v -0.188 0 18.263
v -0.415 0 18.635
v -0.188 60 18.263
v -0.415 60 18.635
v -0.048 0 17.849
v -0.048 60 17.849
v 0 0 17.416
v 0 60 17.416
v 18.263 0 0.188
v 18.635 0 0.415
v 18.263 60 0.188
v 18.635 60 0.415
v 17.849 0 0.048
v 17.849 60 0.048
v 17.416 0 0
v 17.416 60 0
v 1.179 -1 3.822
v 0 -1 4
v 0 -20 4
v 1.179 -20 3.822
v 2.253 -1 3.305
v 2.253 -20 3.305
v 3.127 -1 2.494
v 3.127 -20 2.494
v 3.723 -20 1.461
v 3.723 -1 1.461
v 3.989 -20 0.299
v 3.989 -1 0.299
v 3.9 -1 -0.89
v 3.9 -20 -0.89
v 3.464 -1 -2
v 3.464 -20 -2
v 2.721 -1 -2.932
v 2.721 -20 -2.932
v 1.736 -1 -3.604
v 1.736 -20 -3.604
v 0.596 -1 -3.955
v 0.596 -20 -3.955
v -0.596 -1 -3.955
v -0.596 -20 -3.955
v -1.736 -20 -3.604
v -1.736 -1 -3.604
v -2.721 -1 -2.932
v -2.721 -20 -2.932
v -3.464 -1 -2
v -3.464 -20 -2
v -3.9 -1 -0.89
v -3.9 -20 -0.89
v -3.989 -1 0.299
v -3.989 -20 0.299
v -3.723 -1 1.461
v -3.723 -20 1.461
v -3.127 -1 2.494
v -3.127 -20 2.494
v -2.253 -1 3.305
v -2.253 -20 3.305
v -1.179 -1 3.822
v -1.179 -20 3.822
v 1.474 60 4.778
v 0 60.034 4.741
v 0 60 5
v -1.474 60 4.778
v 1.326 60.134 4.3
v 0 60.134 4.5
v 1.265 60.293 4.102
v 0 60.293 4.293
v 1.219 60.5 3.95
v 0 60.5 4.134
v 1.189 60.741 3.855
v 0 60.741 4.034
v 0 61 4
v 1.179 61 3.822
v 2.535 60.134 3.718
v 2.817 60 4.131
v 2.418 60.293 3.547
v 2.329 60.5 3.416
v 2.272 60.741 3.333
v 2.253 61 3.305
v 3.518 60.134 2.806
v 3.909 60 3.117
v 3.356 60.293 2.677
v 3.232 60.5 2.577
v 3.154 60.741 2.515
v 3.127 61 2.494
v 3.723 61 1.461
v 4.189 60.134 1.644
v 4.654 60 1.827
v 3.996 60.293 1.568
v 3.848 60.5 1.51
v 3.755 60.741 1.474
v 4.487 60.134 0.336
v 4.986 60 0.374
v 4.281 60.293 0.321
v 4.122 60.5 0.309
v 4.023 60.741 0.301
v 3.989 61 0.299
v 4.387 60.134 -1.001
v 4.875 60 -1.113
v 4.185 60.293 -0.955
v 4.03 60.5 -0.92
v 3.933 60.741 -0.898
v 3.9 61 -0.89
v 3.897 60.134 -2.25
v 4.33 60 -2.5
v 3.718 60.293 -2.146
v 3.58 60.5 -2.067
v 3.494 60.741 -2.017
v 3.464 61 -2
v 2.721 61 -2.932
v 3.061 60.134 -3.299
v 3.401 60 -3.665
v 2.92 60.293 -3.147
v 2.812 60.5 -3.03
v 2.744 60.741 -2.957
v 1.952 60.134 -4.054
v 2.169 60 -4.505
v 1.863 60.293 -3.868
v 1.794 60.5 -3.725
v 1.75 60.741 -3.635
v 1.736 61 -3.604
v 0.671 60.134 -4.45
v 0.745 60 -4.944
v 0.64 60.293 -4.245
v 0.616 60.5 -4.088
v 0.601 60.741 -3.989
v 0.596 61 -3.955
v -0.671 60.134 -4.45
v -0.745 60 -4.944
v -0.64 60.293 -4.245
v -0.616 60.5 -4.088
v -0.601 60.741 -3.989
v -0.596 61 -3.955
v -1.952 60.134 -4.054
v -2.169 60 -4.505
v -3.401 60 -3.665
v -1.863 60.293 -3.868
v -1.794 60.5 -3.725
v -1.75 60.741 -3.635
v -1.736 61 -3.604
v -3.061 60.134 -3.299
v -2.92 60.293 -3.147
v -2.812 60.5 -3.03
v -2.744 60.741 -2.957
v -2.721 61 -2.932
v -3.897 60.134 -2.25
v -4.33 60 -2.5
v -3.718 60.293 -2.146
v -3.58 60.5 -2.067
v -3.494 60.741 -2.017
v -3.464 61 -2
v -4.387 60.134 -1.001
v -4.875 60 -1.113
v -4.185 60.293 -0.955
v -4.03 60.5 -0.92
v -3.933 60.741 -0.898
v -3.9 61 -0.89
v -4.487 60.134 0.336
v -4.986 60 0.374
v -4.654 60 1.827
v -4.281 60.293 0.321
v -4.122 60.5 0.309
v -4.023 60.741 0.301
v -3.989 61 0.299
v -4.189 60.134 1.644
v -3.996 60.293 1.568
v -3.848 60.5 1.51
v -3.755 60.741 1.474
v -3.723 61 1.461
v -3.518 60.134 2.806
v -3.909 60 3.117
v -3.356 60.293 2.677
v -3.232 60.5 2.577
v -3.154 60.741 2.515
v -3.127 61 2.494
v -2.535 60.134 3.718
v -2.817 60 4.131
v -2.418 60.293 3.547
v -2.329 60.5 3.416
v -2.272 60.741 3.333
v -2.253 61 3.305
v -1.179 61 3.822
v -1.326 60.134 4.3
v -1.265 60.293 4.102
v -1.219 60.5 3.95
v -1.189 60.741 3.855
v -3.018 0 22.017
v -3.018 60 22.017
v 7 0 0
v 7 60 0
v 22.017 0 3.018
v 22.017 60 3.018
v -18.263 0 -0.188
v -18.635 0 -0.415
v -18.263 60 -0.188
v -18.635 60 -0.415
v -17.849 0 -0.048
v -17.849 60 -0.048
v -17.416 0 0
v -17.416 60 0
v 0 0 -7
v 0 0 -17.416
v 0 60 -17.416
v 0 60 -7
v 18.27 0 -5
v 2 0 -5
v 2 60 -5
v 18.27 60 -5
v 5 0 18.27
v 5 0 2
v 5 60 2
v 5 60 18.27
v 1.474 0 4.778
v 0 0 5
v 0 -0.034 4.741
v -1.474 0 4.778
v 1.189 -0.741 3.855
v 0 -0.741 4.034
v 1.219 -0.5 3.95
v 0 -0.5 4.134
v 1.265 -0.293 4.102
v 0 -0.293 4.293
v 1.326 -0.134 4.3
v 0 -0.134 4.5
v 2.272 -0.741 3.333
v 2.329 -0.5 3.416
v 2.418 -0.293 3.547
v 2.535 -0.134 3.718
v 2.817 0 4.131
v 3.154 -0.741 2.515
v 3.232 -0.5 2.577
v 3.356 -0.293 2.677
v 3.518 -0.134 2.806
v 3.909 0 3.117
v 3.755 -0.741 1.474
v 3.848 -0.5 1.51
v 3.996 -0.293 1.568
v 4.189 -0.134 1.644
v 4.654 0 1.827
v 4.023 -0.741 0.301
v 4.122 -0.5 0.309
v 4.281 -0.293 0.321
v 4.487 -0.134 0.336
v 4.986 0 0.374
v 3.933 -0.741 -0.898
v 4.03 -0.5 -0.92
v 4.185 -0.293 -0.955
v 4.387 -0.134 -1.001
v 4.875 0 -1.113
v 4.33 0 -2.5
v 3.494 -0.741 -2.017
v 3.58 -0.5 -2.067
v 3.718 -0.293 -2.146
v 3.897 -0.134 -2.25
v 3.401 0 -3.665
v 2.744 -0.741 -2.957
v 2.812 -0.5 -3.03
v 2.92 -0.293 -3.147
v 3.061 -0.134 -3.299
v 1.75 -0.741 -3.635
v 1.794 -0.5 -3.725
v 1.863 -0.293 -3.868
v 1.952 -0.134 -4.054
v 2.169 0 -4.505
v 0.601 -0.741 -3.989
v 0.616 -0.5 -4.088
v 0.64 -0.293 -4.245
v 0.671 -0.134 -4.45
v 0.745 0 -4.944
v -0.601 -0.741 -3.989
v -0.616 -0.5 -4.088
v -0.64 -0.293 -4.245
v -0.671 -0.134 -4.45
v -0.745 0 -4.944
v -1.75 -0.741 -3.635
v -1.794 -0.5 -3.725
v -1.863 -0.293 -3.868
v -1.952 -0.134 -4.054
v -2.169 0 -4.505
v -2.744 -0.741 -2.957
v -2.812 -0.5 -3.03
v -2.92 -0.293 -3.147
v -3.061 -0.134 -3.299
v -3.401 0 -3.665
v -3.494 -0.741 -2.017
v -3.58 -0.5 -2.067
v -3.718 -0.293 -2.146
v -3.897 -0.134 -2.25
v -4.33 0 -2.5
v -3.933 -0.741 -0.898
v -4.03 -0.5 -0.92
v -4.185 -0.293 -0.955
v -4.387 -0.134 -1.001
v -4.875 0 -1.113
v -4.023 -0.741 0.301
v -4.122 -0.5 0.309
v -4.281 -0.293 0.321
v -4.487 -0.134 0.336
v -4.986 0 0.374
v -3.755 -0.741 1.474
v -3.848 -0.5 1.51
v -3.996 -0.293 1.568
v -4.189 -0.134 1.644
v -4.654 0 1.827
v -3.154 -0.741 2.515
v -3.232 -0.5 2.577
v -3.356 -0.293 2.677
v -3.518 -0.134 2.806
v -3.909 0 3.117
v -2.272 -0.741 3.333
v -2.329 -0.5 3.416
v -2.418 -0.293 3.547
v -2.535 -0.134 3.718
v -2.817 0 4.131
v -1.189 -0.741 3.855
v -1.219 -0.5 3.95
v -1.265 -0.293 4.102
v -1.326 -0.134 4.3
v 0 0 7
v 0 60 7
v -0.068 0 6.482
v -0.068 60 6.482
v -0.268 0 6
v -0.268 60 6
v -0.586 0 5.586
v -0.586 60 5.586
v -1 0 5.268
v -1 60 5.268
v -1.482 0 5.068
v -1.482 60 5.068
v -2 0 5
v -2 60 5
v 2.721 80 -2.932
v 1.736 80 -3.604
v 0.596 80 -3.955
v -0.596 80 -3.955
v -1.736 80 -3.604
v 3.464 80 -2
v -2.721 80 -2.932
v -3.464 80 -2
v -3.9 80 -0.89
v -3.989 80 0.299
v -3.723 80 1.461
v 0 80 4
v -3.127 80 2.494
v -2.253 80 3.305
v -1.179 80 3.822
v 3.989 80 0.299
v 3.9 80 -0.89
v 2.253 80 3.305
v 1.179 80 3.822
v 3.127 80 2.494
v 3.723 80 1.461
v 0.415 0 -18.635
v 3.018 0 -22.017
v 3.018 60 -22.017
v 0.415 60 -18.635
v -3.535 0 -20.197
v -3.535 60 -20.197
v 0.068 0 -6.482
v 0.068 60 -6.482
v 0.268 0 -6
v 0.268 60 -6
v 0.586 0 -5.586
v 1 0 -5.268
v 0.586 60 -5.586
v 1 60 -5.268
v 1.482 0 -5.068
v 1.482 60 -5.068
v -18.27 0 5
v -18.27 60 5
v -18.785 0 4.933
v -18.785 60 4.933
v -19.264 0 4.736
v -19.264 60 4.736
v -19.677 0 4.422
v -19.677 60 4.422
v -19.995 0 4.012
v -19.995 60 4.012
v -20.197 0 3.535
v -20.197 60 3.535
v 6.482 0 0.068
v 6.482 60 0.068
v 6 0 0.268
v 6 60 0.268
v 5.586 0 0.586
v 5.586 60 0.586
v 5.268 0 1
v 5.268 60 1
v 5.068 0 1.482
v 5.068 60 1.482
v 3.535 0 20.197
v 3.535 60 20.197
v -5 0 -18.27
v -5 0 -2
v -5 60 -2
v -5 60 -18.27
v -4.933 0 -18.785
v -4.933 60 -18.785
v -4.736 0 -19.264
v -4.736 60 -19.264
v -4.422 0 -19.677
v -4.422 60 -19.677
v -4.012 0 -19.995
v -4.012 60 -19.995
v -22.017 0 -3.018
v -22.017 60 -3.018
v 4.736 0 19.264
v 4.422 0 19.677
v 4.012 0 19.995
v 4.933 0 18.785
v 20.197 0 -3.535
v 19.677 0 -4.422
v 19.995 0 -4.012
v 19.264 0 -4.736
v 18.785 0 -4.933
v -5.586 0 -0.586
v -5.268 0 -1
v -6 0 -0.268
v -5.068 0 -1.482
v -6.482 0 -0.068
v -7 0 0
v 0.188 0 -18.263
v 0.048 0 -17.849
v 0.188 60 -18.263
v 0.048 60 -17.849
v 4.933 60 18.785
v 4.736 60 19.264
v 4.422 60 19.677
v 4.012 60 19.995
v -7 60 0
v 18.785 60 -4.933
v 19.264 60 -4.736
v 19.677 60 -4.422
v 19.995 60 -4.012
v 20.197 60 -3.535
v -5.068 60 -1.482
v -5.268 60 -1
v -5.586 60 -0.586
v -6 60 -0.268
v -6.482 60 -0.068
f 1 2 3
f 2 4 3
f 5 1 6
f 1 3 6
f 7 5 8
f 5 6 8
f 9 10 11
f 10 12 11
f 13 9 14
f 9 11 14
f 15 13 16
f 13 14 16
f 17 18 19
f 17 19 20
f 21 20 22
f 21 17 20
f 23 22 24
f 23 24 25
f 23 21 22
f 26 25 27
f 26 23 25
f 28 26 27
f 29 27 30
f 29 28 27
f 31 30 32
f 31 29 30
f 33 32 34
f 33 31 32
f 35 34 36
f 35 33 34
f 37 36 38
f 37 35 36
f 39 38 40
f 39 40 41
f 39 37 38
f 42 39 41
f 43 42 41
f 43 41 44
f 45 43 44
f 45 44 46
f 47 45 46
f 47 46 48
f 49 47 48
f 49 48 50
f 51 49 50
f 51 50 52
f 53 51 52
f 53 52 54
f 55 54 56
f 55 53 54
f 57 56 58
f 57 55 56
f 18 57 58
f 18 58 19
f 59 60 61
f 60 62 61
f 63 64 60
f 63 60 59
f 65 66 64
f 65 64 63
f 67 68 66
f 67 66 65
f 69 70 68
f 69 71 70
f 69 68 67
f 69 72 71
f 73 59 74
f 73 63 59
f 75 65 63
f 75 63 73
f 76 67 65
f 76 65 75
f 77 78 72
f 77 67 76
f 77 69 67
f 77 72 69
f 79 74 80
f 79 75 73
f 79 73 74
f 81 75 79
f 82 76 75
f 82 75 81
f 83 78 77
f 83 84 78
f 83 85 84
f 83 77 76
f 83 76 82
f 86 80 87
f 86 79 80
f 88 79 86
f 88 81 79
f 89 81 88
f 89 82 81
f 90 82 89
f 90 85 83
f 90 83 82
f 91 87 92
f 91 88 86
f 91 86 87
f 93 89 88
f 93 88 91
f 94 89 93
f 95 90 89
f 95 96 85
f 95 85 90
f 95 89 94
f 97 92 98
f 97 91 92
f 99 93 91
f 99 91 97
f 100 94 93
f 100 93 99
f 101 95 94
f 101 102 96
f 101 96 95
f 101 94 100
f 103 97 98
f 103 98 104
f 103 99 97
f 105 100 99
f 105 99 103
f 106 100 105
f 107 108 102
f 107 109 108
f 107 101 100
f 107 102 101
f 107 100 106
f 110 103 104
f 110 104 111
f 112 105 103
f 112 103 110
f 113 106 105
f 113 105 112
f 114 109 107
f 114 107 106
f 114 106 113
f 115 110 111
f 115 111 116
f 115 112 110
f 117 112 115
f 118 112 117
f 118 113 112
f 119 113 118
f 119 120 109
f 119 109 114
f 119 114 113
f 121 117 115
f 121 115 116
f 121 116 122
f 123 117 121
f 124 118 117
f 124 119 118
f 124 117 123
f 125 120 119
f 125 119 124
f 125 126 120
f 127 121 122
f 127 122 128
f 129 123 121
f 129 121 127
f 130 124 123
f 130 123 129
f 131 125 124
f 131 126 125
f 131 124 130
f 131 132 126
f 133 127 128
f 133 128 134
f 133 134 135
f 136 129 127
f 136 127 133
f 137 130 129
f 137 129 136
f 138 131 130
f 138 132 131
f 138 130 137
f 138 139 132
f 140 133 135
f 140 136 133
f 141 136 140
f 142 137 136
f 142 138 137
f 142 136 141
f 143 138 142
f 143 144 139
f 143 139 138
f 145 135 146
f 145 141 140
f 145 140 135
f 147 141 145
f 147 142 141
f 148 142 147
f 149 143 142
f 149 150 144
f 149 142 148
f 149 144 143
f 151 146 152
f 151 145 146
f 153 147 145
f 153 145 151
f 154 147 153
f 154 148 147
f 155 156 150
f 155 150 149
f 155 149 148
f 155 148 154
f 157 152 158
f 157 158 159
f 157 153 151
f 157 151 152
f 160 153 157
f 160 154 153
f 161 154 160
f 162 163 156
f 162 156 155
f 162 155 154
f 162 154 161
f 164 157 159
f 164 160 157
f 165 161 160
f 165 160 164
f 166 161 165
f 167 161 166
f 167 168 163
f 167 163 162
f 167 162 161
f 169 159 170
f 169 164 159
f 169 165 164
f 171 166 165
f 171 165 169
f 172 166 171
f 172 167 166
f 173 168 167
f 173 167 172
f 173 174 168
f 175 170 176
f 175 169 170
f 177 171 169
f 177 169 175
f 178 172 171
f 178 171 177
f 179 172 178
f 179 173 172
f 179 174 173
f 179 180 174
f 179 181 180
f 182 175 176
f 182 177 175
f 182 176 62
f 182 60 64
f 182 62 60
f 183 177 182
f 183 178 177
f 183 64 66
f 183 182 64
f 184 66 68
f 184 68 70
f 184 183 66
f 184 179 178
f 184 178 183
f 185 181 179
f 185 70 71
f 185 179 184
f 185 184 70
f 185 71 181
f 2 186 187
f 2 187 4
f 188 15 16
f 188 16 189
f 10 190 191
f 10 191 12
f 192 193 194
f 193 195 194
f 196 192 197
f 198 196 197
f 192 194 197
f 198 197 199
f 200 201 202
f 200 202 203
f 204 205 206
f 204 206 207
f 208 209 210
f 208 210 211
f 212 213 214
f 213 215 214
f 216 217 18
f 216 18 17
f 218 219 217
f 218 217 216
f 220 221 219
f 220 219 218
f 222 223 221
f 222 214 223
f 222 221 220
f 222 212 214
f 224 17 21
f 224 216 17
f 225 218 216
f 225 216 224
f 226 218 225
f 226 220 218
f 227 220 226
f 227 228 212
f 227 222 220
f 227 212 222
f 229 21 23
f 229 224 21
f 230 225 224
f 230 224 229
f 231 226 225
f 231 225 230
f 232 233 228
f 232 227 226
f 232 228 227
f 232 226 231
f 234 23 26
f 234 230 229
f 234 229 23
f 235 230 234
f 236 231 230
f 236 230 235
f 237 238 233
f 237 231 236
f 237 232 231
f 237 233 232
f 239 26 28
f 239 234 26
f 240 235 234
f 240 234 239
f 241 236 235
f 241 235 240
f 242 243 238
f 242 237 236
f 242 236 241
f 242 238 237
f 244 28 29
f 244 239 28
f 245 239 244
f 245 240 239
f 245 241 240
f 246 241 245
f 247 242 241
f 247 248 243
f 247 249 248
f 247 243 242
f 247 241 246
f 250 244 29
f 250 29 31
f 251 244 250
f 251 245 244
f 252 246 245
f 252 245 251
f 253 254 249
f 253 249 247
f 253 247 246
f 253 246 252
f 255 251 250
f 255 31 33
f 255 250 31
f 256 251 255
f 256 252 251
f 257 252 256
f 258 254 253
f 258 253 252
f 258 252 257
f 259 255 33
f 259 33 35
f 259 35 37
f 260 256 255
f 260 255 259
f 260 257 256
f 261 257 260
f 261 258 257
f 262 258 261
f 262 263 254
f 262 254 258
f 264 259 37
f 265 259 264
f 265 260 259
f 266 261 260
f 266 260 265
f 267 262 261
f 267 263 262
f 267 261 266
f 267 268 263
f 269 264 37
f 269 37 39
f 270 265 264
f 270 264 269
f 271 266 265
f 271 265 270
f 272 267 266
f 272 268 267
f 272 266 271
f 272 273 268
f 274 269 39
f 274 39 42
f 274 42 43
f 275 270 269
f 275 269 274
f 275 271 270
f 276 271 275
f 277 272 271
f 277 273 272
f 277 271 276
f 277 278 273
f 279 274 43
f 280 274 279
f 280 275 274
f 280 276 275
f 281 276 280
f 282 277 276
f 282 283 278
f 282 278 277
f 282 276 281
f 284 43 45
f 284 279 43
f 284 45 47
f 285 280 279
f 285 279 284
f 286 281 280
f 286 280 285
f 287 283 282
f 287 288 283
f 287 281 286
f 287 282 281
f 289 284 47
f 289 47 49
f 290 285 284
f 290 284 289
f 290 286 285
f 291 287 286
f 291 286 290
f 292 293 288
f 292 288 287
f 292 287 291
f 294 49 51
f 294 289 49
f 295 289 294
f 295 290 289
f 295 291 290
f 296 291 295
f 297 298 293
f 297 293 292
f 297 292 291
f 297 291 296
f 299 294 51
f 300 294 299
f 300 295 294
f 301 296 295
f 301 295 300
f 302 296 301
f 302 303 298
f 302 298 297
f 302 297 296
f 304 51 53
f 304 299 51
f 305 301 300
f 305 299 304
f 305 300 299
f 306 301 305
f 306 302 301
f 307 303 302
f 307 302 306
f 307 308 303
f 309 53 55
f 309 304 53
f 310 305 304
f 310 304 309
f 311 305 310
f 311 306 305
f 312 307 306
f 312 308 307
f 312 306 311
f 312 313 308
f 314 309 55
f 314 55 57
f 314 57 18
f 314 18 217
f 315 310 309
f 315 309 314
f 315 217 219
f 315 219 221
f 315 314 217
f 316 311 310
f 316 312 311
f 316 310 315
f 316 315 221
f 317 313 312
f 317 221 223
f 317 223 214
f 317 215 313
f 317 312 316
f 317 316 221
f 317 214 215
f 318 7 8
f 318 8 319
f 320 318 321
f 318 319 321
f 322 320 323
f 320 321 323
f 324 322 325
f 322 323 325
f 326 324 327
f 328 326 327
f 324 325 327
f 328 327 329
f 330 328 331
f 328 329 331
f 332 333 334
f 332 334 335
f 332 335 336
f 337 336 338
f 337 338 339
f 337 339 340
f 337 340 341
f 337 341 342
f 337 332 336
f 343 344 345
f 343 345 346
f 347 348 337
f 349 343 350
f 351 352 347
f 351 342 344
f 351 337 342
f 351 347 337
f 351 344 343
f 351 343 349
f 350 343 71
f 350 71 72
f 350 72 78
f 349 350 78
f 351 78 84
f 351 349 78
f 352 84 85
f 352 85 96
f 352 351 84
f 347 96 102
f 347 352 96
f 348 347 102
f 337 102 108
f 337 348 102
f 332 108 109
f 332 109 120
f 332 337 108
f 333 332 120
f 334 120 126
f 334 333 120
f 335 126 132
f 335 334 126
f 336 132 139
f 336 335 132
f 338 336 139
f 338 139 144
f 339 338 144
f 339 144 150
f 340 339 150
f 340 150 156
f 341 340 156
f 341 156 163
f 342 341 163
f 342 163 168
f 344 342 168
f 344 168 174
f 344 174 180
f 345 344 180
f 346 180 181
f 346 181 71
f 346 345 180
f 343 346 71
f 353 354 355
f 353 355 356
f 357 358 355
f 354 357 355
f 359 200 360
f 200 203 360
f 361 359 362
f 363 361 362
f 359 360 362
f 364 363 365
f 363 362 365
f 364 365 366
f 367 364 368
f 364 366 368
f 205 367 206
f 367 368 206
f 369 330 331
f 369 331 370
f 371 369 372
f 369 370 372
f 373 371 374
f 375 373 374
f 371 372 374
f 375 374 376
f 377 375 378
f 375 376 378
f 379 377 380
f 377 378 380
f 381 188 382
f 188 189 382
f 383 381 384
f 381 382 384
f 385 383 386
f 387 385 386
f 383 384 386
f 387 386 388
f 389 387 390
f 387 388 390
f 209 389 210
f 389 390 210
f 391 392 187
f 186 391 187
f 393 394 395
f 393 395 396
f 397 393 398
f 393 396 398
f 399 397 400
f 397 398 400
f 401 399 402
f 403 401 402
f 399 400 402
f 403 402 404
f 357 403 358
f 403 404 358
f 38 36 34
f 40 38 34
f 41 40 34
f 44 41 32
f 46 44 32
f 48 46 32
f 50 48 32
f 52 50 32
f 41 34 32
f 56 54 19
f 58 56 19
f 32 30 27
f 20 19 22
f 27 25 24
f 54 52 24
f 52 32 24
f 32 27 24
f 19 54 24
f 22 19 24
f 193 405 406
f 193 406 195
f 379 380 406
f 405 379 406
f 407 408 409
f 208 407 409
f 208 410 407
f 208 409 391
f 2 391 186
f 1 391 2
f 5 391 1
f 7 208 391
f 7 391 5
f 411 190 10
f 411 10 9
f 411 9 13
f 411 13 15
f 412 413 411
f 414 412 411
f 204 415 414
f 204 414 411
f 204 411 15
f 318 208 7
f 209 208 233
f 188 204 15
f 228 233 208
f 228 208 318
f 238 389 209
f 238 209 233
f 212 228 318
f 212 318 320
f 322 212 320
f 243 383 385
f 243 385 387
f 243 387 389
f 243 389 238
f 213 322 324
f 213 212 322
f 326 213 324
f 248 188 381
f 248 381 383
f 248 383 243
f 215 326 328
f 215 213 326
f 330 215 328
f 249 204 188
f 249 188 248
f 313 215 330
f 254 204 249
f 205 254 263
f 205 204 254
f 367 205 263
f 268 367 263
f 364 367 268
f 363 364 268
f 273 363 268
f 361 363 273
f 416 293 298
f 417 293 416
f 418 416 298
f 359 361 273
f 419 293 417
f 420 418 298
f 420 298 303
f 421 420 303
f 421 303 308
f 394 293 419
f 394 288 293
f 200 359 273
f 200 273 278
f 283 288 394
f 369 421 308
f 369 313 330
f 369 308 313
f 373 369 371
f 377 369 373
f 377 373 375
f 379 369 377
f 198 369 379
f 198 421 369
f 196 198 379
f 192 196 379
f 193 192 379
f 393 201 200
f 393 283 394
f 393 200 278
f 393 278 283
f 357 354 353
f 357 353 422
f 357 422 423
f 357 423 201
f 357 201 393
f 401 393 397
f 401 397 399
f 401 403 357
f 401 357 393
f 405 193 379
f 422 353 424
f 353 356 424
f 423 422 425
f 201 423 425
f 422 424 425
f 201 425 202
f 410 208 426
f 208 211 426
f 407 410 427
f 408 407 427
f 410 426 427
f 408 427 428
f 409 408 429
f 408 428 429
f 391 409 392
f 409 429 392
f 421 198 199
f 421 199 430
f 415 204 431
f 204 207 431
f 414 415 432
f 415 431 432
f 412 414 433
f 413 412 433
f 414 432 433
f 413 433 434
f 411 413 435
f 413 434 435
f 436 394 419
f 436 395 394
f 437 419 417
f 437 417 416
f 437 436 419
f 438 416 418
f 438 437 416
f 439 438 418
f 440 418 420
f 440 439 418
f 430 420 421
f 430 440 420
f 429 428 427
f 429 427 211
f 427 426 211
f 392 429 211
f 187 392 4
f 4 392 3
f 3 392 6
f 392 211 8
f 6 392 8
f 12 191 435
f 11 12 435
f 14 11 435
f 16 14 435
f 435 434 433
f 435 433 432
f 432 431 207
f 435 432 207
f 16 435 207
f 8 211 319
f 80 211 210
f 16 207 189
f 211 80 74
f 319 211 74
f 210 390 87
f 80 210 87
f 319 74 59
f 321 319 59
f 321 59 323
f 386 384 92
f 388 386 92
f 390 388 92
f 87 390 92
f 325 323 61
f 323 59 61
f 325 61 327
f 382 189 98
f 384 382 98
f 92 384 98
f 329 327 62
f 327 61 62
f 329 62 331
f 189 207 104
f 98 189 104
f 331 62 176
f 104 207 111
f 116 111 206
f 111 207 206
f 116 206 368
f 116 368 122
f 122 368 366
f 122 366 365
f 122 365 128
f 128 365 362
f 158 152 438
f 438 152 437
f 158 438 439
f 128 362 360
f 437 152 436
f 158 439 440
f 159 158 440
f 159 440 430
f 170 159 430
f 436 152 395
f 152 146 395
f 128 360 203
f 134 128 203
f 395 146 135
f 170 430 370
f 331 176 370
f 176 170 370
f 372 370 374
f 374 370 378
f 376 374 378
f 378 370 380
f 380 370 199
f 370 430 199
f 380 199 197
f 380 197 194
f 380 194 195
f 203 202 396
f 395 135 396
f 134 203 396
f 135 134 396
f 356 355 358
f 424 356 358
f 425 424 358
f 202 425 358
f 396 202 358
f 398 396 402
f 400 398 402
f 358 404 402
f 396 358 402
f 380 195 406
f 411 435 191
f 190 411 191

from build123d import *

# Parameters (mm, degrees)
BOSS_EXTRUDE1_DEPTH = 60
FILLET1_R           = 2
SKETCH3_R           = 1.870137446
CUT_EXTRUDE1_DEPTH  = 60
SKETCH4_R           = 4
BOSS_EXTRUDE2_DEPTH = 50
FILLET2_R           = 1


with BuildPart() as part:
    # Sketch2 → Boss-Extrude1 (new body)
    with BuildSketch(Plane(origin=(0, 0, 0), x_dir=(1, 0, 0), z_dir=(0, 1, 0))):
        Polygon((-5, 0), (-5, 19.790786282), (3.017767954, 22.016679806), (0, 18.09611266), (0, 5), (19.790786282, 5), (22.016679806, -3.017767954), (18.09611266, 0), (5, 0), (5, -19.790786282), (-3.017767954, -22.016679806), (0, -18.09611266), (0, -5), (-19.790786282, -5), (-22.016679806, 3.017767954), (-18.09611266, 0), align=None)
    extrude(amount=BOSS_EXTRUDE1_DEPTH)

    # Fillet1
    fillet1_edges = [part.edges().sort_by_distance(p)[0] for p in [
        (19.790786282, 30, -5),
        (18.09611266, 30, 0),
        (5, 30, 0),
        (5, 30, 19.790786282),
        (0, 30, 18.09611266),
        (0, 30, 5),
        (-19.790786282, 30, 5),
        (-18.09611266, 30, 0),
        (-5, 30, 0),
        (-5, 30, -19.790786282),
        (0, 30, -18.09611266),
        (0, 30, -5),
    ]]
    fillet(fillet1_edges, radius=FILLET1_R)

    # Sketch3 → Cut-Extrude1 (cut)
    with BuildSketch(Plane(origin=(0, 60, 0), x_dir=(1, 0, 0), z_dir=(0, 1, 0))):
        with Locations(Location((0, 0, 0), (0, 0, 270))):
            Circle(SKETCH3_R)
    extrude(amount=-CUT_EXTRUDE1_DEPTH, mode=Mode.SUBTRACT)

    # Sketch4 → Boss-Extrude2 (add, symmetric)
    with BuildSketch(Plane(origin=(0, 30, 0), x_dir=(1, 0, 0), z_dir=(0, 1, 0))):
        with Locations(Location((0, 0, 0), (0, 0, 270))):
            Circle(SKETCH4_R)
    extrude(amount=BOSS_EXTRUDE2_DEPTH, both=True)

    # Fillet2
    fillet2_edges = [part.edges().sort_by_distance(p)[0] for p in [
        (0, 0, -4),
        (0, 60, -4),
    ]]
    fillet(fillet2_edges, radius=FILLET2_R)


solid = part.part
